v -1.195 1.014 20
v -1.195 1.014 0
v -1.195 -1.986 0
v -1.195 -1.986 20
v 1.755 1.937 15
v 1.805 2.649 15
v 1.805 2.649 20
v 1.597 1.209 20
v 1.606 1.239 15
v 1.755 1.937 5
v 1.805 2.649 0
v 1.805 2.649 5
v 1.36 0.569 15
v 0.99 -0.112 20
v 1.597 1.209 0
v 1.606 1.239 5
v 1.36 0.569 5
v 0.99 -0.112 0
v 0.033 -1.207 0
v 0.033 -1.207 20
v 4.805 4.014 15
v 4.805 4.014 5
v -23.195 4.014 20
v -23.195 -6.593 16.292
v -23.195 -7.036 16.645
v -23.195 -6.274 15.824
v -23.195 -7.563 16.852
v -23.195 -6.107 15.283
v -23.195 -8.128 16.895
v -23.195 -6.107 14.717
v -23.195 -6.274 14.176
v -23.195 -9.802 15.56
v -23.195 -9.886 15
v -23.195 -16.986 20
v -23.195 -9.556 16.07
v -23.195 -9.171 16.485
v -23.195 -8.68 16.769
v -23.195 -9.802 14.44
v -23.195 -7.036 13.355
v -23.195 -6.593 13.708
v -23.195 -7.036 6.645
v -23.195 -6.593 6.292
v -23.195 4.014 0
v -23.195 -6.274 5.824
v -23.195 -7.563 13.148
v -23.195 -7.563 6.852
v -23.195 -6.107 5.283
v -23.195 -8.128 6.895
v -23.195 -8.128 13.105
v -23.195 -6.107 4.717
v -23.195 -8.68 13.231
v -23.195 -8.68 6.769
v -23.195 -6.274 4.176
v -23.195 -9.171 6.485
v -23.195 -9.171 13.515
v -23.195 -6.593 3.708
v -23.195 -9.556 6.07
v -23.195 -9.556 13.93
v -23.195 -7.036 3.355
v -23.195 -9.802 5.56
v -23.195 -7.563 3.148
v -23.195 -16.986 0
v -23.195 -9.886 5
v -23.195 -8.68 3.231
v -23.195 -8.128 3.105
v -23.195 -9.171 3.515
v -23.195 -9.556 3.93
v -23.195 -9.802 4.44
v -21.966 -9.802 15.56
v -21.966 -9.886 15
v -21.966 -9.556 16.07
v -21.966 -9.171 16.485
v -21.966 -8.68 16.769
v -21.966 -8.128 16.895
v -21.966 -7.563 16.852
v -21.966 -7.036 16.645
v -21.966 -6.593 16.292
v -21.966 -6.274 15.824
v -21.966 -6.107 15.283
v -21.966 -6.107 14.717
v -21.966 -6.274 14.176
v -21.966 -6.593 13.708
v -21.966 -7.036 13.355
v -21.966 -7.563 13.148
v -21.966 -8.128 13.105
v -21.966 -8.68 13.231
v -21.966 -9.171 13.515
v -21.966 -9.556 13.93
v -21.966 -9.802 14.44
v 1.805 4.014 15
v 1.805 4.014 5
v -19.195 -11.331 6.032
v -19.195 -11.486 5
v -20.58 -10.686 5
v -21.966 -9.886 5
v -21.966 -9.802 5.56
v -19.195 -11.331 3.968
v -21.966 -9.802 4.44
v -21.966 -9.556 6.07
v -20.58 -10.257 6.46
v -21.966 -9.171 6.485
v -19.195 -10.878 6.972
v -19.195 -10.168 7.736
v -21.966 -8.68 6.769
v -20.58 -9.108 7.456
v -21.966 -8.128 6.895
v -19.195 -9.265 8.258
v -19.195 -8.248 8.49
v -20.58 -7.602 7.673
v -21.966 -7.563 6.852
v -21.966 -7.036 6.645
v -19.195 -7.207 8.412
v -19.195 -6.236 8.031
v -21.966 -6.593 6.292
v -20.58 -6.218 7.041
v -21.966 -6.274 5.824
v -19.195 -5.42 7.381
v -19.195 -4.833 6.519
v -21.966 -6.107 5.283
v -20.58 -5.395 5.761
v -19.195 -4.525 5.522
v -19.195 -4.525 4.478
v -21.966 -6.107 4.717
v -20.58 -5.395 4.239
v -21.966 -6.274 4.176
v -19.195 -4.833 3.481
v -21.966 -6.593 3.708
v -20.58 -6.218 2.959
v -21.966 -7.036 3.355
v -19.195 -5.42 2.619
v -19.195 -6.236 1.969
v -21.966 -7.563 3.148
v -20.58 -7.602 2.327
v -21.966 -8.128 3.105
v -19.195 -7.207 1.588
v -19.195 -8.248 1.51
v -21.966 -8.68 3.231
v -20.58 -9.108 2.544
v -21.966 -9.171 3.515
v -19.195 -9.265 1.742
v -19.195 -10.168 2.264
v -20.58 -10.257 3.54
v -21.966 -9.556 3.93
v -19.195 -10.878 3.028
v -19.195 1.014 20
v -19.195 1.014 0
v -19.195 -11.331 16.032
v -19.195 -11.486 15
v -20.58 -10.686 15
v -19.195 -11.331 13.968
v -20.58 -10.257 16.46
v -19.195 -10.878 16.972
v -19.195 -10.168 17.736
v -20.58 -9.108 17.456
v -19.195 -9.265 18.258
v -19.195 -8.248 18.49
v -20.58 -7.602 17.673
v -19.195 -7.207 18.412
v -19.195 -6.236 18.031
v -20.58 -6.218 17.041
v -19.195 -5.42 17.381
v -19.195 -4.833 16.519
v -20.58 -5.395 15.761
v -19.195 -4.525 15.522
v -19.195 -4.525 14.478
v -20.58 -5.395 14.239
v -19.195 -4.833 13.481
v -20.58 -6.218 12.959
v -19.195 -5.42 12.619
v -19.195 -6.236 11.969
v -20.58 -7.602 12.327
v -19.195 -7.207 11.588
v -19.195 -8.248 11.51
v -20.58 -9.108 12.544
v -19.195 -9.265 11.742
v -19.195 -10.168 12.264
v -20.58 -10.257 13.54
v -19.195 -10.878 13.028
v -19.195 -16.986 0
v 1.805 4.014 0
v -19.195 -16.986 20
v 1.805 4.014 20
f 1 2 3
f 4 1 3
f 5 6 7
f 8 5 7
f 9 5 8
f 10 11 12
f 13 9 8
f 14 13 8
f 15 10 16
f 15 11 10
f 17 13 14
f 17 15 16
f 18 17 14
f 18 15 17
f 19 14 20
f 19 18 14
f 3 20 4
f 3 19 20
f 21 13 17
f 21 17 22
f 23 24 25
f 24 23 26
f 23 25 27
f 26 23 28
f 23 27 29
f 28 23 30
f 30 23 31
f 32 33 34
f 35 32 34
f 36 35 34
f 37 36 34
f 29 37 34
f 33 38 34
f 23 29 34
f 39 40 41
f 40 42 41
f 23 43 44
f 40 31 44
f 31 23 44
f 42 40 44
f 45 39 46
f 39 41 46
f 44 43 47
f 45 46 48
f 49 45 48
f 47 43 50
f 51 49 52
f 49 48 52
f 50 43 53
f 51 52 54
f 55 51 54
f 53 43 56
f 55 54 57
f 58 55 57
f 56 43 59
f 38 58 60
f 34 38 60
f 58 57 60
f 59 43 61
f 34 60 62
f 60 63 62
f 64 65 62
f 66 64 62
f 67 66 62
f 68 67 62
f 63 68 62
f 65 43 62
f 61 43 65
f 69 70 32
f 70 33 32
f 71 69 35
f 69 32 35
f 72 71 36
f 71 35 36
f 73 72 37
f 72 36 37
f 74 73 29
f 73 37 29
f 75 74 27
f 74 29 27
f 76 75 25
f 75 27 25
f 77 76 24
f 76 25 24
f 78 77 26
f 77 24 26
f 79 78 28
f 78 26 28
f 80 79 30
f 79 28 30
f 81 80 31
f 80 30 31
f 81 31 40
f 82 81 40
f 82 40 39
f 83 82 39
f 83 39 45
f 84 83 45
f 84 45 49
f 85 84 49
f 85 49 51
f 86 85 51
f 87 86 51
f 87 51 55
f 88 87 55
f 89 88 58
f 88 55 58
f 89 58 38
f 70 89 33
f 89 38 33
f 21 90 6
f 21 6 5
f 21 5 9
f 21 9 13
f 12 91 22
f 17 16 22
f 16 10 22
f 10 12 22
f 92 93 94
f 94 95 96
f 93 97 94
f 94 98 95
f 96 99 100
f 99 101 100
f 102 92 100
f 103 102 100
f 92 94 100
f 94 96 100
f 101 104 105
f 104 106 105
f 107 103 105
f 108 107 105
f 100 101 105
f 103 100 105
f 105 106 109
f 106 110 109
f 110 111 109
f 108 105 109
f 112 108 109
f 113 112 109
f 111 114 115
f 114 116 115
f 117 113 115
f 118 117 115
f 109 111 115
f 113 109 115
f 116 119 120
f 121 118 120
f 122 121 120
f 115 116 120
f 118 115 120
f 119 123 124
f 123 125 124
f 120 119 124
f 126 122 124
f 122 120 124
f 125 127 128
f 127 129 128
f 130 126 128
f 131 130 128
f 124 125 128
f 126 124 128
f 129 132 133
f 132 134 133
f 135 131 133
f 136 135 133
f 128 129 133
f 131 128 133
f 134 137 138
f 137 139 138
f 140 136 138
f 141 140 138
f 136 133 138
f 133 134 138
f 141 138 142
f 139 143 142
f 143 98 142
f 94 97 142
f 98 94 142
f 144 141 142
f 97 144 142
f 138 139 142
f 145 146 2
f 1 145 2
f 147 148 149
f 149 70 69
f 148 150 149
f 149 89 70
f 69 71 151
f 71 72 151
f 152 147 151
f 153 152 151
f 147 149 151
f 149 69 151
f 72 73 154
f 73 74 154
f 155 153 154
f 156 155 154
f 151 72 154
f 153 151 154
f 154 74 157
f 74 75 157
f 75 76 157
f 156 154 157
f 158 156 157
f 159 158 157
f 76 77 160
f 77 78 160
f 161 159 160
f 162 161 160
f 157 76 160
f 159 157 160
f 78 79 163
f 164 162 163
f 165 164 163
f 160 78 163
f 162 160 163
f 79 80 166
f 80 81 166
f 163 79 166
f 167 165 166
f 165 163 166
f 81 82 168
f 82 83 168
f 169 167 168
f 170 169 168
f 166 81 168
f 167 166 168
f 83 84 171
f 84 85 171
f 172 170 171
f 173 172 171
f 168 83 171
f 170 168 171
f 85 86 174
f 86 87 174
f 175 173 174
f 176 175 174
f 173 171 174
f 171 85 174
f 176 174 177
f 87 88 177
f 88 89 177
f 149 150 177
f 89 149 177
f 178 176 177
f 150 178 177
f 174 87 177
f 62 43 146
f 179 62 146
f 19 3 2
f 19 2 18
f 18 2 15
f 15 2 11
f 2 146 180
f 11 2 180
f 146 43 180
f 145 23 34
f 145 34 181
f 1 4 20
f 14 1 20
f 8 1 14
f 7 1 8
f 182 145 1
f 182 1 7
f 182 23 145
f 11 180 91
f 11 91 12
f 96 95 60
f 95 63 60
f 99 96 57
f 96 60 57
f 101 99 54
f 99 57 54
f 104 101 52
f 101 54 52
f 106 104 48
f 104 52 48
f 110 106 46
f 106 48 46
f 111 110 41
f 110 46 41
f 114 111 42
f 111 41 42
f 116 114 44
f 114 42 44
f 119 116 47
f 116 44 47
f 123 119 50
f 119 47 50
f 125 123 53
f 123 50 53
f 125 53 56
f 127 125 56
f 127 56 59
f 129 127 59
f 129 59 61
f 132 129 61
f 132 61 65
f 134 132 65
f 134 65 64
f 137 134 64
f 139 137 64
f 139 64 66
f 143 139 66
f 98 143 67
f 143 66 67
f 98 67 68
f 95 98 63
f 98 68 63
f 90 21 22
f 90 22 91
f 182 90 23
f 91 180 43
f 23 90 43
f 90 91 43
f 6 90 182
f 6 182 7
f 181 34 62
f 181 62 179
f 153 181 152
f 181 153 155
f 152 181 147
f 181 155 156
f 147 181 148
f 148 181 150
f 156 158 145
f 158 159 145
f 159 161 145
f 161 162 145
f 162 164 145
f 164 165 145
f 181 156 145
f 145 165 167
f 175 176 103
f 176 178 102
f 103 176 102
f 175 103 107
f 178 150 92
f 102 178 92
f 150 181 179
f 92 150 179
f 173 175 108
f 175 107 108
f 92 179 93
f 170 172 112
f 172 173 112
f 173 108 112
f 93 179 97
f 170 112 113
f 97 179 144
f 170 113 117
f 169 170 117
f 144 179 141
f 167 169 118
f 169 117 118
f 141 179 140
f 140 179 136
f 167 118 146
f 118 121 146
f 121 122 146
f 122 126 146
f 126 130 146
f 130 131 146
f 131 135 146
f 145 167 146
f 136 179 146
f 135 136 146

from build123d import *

# Parameters (mm, degrees)
F1_DEPTH       = 20
F2_DEPTH       = 15
F3_DEPTH       = 5
F5_D           = 3.8
F5_DEPTH       = 20
F5_CSINK_D     = 7
F5_CSINK_ANGLE = 60
F5_TIP         = 1.1416351762
F6_T4_DEPTH    = 43.1732604525
F6_T10_DEPTH   = 43.1732604525
F6_T16_DEPTH   = 43.1732604525
F6_T23_DEPTH   = 43.1732604525
F6_T29_DEPTH   = 43.1732604525


# Not quite as in the source:
# - a fillet or chamfer that OpenCascade refuses, or shapes differently, is made with other operations: its cross-section is extruded or revolved along the edge and cut away or added


with BuildPart() as f1:
    # F0 (on Top) → F1 (new body)
    with BuildSketch(Plane.XY):
        Polygon((-23.1947004795, 4.0139819533), (-23.1947004795, -16.9860180467), (-19.1947004795, -16.9860180467), (-19.1947004795, 1.0139819533), (-1.1947004795, 1.0139819533), (-1.1947004795, -1.9860180467), (1.8052995205, -1.9860180467), (1.8052995205, 1.0139819533), (1.8052995205, 4.0139819533), align=None)
    extrude(amount=F1_DEPTH)

    # F0 (on Top) → F2 (join)
    with BuildSketch(Plane.XY):
        Polygon((4.8052995205, 4.0139819533), (1.8052995205, 4.0139819533), (1.8052995205, 1.0139819533), align=None)
    extrude(amount=F2_DEPTH)

    # F0 (on Top) → F3 (cut)
    with BuildSketch(Plane.XY):
        Polygon((4.8052995205, 4.0139819533), (1.8052995205, 4.0139819533), (1.8052995205, 1.0139819533), align=None)
    extrude(amount=F3_DEPTH, mode=Mode.SUBTRACT)

    # F5
    with Locations(Plane.YZ.offset(-19.1947004795)):
        with Locations((-7.9860180467, 15), (-7.9860180467, 5)):
            CounterSinkHole(F5_D / 2, F5_CSINK_D / 2, depth=F5_DEPTH, counter_sink_angle=F5_CSINK_ANGLE)
            with Locations((0, 0, -(F5_DEPTH + F5_TIP / 2))):  # 118° drill point
                Cone(0, F5_D / 2, F5_TIP, mode=Mode.SUBTRACT)

    # F6: fillet of radius 5.08 on 1 edges, made by hand


with BuildPart() as f6_tool2:
    # F6_s3 → F6_t4 (new body)
    with BuildSketch(Plane.XY.offset(-11.5866302263)):
        with BuildLine():
            ThreePointArc((1.8052995205, 2.6486340438), (0.9898510796, -0.1118007046), (-1.1947004795, -1.9860180467))
            Line((-1.1947004795, -1.9860180467), (-1.1531004795, -2.0787110885))
            ThreePointArc((-1.1531004795, -2.0787110885), (0.3052995205, -2.0876180467), (1.8052995205, -2.0876180467))
            Line((1.8052995205, -2.0876180467), (1.9068995205, -1.9860180467))
            Line((1.9068995205, -1.9860180467), (1.9068995205, 2.6486340438))
            Line((1.9068995205, 2.6486340438), (1.8052995205, 2.6486340438))
        make_face()
    extrude(amount=F6_T4_DEPTH)

    split(bisect_by=Plane(origin=(0.3956587836, -0.3956587836, 0), x_dir=(0, 0, 1), z_dir=(-0.7071067812, 0.7071067812, 0)), keep=Keep.TOP)

    split(bisect_by=Plane.XY.offset(5), keep=Keep.BOTTOM)


with BuildPart() as f1_1:
    add(f1.part)

    # F6_t1: cut F6_tool2
    add(f6_tool2.part, mode=Mode.SUBTRACT)


with BuildPart() as f6_tool8:
    # F6_s9 → F6_t10 (new body)
    with BuildSketch(Plane.XY.offset(-11.5866302263)):
        with BuildLine():
            ThreePointArc((1.8052995205, 2.6486340438), (0.9898510796, -0.1118007046), (-1.1947004795, -1.9860180467))
            Line((-1.1947004795, -1.9860180467), (-1.1531004795, -2.0787110885))
            ThreePointArc((-1.1531004795, -2.0787110885), (0.3052995205, -2.0876180467), (1.8052995205, -2.0876180467))
            Line((1.8052995205, -2.0876180467), (1.9068995205, -1.9860180467))
            Line((1.9068995205, -1.9860180467), (1.9068995205, 2.6486340438))
            Line((1.9068995205, 2.6486340438), (1.8052995205, 2.6486340438))
        make_face()
    extrude(amount=F6_T10_DEPTH)

    split(bisect_by=Plane(origin=(0.3956587836, -0.3956587836, 0), x_dir=(0, 0, 1), z_dir=(0.7071067812, -0.7071067812, 0)), keep=Keep.TOP)

    split(bisect_by=Plane.XY.offset(5), keep=Keep.BOTTOM)


with BuildPart() as f1_2:
    add(f1_1.part)

    # F6_t7: cut F6_tool8
    add(f6_tool8.part, mode=Mode.SUBTRACT)


with BuildPart() as f6_tool14:
    # F6_s15 → F6_t16 (new body)
    with BuildSketch(Plane.XY.offset(-11.5866302263)):
        with BuildLine():
            ThreePointArc((1.8052995205, 2.6486340438), (0.9898510796, -0.1118007046), (-1.1947004795, -1.9860180467))
            Line((-1.1947004795, -1.9860180467), (-1.1531004795, -2.0787110885))
            ThreePointArc((-1.1531004795, -2.0787110885), (0.3052995205, -2.0876180467), (1.8052995205, -2.0876180467))
            Line((1.8052995205, -2.0876180467), (1.9068995205, -1.9860180467))
            Line((1.9068995205, -1.9860180467), (1.9068995205, 2.6486340438))
            Line((1.9068995205, 2.6486340438), (1.8052995205, 2.6486340438))
        make_face()
    extrude(amount=F6_T16_DEPTH)

    split(bisect_by=Plane.XY.offset(15), keep=Keep.BOTTOM)

    split(bisect_by=Plane(origin=(0.3956587836, -0.3956587836, 0), x_dir=(0, 0, 1), z_dir=(0.7071067812, -0.7071067812, 0)), keep=Keep.TOP)

    split(bisect_by=Plane.XY.offset(5), keep=Keep.TOP)


with BuildPart() as f1_3:
    add(f1_2.part)

    # F6_t13: cut F6_tool14
    add(f6_tool14.part, mode=Mode.SUBTRACT)


with BuildPart() as f6_tool21:
    # F6_s22 → F6_t23 (new body)
    with BuildSketch(Plane.XY.offset(-11.5866302263)):
        with BuildLine():
            ThreePointArc((1.8052995205, 2.6486340438), (0.9898510796, -0.1118007046), (-1.1947004795, -1.9860180467))
            Line((-1.1947004795, -1.9860180467), (-1.1531004795, -2.0787110885))
            ThreePointArc((-1.1531004795, -2.0787110885), (0.3052995205, -2.0876180467), (1.8052995205, -2.0876180467))
            Line((1.8052995205, -2.0876180467), (1.9068995205, -1.9860180467))
            Line((1.9068995205, -1.9860180467), (1.9068995205, 2.6486340438))
            Line((1.9068995205, 2.6486340438), (1.8052995205, 2.6486340438))
        make_face()
    extrude(amount=F6_T23_DEPTH)

    split(bisect_by=Plane.XY.offset(15), keep=Keep.TOP)

    split(bisect_by=Plane(origin=(0.3956587836, -0.3956587836, 0), x_dir=(0, 0, 1), z_dir=(-0.7071067812, 0.7071067812, 0)), keep=Keep.TOP)


with BuildPart() as f1_4:
    add(f1_3.part)

    # F6_t20: cut F6_tool21
    add(f6_tool21.part, mode=Mode.SUBTRACT)


with BuildPart() as f6_tool27:
    # F6_s28 → F6_t29 (new body)
    with BuildSketch(Plane.XY.offset(-11.5866302263)):
        with BuildLine():
            ThreePointArc((1.8052995205, 2.6486340438), (0.9898510796, -0.1118007046), (-1.1947004795, -1.9860180467))
            Line((-1.1947004795, -1.9860180467), (-1.1531004795, -2.0787110885))
            ThreePointArc((-1.1531004795, -2.0787110885), (0.3052995205, -2.0876180467), (1.8052995205, -2.0876180467))
            Line((1.8052995205, -2.0876180467), (1.9068995205, -1.9860180467))
            Line((1.9068995205, -1.9860180467), (1.9068995205, 2.6486340438))
            Line((1.9068995205, 2.6486340438), (1.8052995205, 2.6486340438))
        make_face()
    extrude(amount=F6_T29_DEPTH)

    split(bisect_by=Plane.XY.offset(15), keep=Keep.TOP)

    split(bisect_by=Plane(origin=(0.3956587836, -0.3956587836, 0), x_dir=(0, 0, 1), z_dir=(0.7071067812, -0.7071067812, 0)), keep=Keep.TOP)


with BuildPart() as f1_5:
    add(f1_4.part)

    # F6_t26: cut F6_tool27
    add(f6_tool27.part, mode=Mode.SUBTRACT)


solid = f1_5.part
